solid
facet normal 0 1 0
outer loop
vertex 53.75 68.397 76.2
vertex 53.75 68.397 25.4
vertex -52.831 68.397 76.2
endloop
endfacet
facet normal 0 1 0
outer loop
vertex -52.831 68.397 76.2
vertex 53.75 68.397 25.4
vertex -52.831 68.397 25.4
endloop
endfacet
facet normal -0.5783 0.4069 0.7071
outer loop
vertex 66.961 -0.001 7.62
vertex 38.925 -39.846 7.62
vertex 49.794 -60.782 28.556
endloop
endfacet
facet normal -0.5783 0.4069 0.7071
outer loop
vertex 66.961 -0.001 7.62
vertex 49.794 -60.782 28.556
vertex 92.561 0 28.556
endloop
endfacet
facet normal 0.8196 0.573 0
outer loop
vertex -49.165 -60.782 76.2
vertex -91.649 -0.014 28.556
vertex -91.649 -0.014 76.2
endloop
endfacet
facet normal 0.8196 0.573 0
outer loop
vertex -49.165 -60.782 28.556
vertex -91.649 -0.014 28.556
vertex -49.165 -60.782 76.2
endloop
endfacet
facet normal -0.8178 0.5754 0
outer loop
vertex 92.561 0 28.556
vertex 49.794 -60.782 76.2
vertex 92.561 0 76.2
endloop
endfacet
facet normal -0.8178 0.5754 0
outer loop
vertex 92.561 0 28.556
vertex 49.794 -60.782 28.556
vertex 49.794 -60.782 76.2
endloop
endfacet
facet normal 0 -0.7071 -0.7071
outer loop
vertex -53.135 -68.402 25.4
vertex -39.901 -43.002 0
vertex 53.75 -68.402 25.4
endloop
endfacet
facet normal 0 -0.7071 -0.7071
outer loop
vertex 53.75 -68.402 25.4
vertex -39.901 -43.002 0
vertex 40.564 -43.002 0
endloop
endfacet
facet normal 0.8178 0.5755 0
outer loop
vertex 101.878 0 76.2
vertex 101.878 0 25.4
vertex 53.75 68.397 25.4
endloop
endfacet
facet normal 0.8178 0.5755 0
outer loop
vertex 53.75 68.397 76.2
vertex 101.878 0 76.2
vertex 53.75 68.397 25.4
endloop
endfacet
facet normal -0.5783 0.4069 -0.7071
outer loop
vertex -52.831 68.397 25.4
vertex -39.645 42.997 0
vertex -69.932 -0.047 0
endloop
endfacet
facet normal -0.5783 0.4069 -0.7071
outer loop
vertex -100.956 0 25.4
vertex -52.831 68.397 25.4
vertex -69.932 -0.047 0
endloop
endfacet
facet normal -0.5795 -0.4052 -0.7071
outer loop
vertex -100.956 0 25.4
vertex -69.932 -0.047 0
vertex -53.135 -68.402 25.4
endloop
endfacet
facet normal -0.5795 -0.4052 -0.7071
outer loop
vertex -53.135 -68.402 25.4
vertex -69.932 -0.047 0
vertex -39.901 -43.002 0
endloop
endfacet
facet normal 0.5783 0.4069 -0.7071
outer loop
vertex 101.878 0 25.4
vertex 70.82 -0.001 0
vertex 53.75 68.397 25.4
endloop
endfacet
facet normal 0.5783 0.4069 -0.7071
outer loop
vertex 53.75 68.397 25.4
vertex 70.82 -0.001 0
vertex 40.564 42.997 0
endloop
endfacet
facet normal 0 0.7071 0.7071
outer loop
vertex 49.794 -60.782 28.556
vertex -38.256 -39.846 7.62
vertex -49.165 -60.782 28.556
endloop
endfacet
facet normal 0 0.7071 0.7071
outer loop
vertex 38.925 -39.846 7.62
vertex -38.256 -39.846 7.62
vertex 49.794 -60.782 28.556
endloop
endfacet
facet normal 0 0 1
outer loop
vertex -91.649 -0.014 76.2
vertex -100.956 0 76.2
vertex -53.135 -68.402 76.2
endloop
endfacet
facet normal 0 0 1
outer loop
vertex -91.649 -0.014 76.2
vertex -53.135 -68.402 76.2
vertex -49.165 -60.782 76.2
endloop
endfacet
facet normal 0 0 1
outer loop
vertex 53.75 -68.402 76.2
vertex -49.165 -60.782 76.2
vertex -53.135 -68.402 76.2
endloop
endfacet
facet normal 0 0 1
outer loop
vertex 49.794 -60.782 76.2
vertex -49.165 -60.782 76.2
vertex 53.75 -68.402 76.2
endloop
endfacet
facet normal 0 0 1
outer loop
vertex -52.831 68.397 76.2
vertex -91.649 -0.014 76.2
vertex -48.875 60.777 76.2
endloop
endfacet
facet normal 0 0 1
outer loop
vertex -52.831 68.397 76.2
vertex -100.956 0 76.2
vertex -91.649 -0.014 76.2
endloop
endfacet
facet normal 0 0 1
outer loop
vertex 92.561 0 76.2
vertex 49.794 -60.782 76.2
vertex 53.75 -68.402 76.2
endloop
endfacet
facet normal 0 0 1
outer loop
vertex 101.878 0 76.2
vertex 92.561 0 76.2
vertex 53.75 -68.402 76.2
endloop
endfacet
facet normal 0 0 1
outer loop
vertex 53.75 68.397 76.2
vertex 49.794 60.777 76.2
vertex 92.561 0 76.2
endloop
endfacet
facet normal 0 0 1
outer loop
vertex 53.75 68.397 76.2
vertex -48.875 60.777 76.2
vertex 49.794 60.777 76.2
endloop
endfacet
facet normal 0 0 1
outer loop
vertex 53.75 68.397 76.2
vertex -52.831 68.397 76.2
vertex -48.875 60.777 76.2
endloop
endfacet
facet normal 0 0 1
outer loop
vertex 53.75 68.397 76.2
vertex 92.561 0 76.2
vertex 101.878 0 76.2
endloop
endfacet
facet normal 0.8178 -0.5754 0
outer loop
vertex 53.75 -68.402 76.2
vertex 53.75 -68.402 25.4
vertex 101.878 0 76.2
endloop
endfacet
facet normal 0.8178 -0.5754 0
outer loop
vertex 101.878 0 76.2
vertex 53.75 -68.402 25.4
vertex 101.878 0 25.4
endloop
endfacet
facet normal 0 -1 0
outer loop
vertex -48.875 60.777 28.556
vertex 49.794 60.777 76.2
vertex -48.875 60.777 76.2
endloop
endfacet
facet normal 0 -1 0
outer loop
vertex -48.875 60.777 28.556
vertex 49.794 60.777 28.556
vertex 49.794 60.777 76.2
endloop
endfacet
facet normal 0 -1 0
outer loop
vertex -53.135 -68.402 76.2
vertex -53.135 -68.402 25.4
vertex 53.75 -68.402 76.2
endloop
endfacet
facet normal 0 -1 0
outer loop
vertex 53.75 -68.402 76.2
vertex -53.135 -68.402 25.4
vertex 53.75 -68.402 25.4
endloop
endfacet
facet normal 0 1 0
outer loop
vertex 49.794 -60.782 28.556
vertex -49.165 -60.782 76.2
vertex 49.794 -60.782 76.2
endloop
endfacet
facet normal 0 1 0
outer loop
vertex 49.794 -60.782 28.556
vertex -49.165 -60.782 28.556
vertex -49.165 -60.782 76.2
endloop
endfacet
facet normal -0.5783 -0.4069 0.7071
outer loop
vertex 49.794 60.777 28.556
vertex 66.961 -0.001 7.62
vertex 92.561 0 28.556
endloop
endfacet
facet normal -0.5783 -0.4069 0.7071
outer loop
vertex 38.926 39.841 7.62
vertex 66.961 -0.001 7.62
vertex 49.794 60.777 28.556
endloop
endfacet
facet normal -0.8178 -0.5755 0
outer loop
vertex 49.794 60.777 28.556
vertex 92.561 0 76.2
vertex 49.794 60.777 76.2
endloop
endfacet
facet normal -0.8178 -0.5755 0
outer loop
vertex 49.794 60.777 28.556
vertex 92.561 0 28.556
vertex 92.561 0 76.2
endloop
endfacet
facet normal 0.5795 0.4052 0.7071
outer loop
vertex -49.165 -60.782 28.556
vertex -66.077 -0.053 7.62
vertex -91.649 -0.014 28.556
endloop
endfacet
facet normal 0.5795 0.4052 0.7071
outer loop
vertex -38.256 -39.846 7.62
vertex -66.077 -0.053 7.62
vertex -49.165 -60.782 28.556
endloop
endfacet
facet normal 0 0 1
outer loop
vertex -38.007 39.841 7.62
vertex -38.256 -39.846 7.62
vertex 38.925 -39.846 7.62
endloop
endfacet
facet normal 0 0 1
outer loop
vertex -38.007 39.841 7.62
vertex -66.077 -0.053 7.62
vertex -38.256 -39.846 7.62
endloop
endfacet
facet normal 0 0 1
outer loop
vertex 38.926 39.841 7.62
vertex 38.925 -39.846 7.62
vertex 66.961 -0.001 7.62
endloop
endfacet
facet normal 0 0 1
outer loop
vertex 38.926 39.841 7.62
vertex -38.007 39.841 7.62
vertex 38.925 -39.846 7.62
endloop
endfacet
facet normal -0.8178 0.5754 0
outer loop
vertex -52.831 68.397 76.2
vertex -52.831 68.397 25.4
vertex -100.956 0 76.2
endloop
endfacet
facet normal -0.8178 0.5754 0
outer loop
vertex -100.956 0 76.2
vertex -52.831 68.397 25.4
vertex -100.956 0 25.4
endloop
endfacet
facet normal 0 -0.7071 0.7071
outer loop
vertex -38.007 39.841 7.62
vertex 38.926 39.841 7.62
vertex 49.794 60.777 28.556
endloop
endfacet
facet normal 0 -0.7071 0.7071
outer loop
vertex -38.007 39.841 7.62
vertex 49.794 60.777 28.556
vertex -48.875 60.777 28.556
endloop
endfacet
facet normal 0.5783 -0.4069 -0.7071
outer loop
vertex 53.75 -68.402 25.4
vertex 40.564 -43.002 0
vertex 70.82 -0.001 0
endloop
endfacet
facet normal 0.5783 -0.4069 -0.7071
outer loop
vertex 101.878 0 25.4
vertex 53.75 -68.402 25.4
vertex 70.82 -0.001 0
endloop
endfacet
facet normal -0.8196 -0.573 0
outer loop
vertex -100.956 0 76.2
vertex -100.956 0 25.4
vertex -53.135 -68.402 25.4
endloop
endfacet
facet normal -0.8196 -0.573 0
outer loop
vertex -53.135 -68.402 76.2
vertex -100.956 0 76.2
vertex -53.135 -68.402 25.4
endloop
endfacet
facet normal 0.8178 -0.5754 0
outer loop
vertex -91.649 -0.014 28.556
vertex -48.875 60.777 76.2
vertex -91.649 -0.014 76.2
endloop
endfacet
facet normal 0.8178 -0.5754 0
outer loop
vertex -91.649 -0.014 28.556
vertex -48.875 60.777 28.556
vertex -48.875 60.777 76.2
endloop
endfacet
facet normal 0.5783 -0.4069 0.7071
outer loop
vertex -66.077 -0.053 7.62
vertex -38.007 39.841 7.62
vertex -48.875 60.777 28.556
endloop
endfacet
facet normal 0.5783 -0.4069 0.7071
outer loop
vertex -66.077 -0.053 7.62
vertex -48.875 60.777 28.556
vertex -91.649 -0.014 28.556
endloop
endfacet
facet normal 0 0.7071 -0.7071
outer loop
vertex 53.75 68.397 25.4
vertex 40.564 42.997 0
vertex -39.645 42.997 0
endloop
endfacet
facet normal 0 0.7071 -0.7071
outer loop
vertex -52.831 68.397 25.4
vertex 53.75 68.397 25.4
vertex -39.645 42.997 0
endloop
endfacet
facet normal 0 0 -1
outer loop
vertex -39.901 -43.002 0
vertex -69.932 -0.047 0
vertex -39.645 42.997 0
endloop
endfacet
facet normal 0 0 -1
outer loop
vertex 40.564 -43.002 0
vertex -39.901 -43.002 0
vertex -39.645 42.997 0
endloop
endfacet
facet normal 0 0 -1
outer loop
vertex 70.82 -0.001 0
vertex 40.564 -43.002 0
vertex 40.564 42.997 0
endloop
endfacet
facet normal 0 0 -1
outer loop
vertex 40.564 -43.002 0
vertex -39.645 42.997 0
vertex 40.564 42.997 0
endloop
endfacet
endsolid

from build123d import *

# Parameters (mm, degrees)
F1_DEPTH = 76.2
F2_SIZE  = 25.4
F3_T     = -7.62


with BuildPart() as f1:
    # F0 (on Top) → F1 (new body)
    with BuildSketch(Plane.XY):
        Polygon((-52.830831, 42.997032), (0, 42.997032), (53.74952, 42.997032), (53.74952, 68.397032), (-52.830831, 68.397032), align=None)
        Polygon((-75.556472, 0), (-52.830831, 42.997032), (-52.830831, 68.397032), (-100.956472, 0), align=None)
        Polygon((53.74952, 68.397032), (53.74952, 42.997032), (76.477893, 0), (101.877893, 0), align=None)
        Polygon((53.74952, 42.997032), (0, 42.997032), (-52.830831, 42.997032), (-75.556472, 0), (-52.830831, -43.0022), (53.74952, -43.0022), (76.477893, 0), align=None)
        Polygon((101.877893, 0), (76.477893, 0), (53.74952, -43.0022), (53.74952, -68.4022), align=None)
        Polygon((53.74952, -43.0022), (-52.830831, -43.0022), (-53.135242, -68.4022), (53.74952, -68.4022), align=None)
        Polygon((-52.830831, -43.0022), (-75.556472, 0), (-100.956472, 0), (-53.135242, -68.4022), align=None)
    extrude(amount=F1_DEPTH)

    # F2
    f2_edges = [f1.edges().sort_by_distance(p)[0] for p in [
        (0.459345, 68.397032, 0),
        (-76.893652, 34.198516, 0),
        (-77.045857, -34.2011, 0),
        (0.307139, -68.4022, 0),
        (77.813707, -34.2011, 0),
        (77.813707, 34.198516, 0),
    ]]
    chamfer(f2_edges, length=F2_SIZE)

    # F3
    f3_openings = [f1.faces().sort_by_distance(p)[0] for p in [
        (0.425958, -0.024737, 76.2),
    ]]
    offset(amount=F3_T, openings=f3_openings)


solid = f1.part
